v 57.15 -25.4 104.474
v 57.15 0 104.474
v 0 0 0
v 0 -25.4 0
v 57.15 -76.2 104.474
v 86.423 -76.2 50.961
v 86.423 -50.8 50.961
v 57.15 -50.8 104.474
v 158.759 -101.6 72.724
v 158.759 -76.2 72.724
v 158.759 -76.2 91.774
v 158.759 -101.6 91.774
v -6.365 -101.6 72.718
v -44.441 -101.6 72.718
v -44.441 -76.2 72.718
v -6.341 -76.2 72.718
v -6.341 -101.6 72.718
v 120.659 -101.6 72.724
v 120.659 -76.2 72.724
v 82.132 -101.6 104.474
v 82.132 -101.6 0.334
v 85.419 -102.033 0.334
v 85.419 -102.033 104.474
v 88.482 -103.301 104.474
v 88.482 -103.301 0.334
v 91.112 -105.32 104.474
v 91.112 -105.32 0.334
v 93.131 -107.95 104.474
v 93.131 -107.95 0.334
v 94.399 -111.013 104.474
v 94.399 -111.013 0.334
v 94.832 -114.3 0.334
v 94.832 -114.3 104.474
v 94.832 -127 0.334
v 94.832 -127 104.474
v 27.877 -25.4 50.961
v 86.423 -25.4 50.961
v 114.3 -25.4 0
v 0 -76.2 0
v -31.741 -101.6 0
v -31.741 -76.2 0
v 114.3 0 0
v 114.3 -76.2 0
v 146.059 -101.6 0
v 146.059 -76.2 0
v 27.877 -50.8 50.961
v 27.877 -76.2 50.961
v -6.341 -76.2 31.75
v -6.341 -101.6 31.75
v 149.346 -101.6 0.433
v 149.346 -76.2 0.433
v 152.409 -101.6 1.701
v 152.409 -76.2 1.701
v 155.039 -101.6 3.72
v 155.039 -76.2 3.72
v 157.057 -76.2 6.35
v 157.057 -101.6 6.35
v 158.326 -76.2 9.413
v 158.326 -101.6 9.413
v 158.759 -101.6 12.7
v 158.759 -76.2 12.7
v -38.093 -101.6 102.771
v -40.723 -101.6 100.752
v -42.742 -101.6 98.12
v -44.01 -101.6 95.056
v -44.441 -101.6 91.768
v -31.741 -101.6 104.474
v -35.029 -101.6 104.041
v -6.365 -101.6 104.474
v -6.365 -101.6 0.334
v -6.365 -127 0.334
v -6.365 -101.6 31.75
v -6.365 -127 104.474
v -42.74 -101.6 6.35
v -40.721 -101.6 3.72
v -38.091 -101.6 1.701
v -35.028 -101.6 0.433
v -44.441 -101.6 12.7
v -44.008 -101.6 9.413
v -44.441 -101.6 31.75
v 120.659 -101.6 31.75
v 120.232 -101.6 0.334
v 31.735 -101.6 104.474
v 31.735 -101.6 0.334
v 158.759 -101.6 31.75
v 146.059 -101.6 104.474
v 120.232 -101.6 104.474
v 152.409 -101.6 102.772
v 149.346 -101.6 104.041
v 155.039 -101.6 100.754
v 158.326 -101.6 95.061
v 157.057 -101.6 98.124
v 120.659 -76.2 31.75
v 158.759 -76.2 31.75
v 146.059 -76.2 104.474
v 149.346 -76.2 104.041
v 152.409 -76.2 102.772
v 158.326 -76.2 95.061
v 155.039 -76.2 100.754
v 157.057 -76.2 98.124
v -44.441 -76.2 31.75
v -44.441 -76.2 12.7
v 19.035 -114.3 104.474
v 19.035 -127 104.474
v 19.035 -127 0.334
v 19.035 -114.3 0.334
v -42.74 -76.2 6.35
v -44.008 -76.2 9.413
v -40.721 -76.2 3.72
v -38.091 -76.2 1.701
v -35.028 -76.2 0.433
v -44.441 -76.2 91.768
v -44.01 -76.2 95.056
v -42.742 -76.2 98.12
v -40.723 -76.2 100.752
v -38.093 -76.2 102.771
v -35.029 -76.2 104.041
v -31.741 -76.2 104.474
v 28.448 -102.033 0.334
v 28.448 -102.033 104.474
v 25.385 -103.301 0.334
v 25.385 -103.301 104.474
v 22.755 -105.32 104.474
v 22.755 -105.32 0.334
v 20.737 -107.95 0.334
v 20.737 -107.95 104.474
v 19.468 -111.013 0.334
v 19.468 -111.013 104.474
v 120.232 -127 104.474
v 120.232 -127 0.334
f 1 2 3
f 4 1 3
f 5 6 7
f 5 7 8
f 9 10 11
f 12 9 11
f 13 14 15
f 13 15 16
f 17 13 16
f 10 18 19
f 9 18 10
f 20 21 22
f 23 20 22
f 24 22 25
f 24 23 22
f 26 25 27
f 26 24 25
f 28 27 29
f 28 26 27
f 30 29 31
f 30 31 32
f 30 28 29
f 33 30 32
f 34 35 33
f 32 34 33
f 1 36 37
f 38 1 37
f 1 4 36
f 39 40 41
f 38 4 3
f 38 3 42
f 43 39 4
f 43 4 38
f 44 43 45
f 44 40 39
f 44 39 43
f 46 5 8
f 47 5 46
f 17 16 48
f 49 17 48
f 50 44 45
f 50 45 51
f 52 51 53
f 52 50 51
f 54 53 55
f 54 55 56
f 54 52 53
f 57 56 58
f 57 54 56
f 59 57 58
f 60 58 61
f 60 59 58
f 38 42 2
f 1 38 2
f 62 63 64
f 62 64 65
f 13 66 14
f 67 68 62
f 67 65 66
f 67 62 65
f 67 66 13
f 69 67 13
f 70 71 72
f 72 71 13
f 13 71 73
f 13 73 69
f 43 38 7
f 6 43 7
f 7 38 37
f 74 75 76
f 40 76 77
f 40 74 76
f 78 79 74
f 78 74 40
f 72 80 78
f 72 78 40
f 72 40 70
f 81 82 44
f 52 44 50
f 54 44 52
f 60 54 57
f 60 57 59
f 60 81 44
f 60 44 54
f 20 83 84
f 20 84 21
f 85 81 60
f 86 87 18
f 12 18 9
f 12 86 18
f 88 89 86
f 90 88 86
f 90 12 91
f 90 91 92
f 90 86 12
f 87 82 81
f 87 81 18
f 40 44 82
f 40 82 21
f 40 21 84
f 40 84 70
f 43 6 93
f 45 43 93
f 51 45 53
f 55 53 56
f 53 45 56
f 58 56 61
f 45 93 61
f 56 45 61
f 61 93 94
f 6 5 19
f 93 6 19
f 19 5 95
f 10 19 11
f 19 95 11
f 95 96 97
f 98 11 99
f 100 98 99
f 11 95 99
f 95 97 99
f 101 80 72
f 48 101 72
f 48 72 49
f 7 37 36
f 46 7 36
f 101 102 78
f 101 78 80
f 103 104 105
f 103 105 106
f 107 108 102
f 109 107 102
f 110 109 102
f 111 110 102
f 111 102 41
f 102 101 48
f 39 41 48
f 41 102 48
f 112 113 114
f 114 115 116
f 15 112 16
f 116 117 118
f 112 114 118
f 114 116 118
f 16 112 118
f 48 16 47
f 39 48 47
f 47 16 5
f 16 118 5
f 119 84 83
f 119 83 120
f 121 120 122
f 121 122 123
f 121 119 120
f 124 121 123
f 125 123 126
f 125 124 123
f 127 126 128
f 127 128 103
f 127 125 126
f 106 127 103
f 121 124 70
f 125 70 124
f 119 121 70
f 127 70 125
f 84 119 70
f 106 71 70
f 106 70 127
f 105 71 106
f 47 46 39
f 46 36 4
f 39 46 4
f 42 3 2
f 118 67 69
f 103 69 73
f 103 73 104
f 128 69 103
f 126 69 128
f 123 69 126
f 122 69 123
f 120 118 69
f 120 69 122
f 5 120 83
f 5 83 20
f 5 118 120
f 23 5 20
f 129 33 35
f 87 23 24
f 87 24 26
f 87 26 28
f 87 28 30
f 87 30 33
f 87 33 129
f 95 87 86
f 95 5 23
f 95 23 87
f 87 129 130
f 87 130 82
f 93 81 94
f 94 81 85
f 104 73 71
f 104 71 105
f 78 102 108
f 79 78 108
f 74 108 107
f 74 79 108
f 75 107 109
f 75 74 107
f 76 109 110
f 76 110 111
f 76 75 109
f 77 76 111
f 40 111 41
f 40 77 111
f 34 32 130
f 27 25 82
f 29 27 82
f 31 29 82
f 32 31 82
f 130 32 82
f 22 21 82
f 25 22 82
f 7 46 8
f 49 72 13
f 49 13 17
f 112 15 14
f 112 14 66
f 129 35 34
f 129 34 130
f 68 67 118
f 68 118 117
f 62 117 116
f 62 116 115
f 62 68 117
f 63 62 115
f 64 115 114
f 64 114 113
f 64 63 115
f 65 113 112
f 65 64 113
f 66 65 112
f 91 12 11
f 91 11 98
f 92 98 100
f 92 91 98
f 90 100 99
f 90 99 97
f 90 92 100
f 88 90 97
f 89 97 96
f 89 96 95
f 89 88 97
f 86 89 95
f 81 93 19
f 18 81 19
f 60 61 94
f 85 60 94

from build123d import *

# Parameters (mm, degrees)
F1_DEPTH  = 25.4
F3_DEPTH  = 25.4
F5_DEPTH  = 25.4
F7_DEPTH  = 25.4
F9_DEPTH  = 25.4
F10_W     = 25.4
F10_H     = 31.75
F11_DEPTH = 25.4
F12_W     = 25.4
F12_H     = 31.75
F12_H_2   = 31.756058
F13_DEPTH = 25.4
F14_W     = 12.7
F14_H     = 19.05
F15_DEPTH = 25.4
F16_W     = 12.7
F16_H     = 19.05
F17_DEPTH = 25.4
F18_W     = 25.4
F18_H     = 25.4
F19_DEPTH = 104.14
F21_DEPTH = 104.14
F23_DEPTH = 104.14


with BuildPart() as f1:
    # F0 (on Front) → F1 (new body)
    with BuildSketch(Plane.XZ):
        Polygon((57.15, 104.473576), (0, 0), (57.15, 0), (57.15, 53.673576), align=None)
        Polygon((57.15, 53.673576), (57.15, 0), (114.3, 0), (57.15, 104.473576), align=None)
    extrude(amount=F1_DEPTH)

    # F2 (on face) → F3 (join)
    with BuildSketch(Plane.XZ.offset(25.4)):
        Polygon((86.422825, 50.961122), (57.15, 50.961122), (27.877175, 50.961122), (0, 0), (114.3, 0), align=None)
    extrude(amount=F3_DEPTH)

    # F4 (on face) → F5 (join)
    with BuildSketch(Plane.XZ.offset(50.8)):
        Polygon((86.422825, 50.961122), (27.877175, 50.961122), (0, 0), (114.3, 0), align=None)
    extrude(amount=F5_DEPTH)

    # F6 (on face) → F7 (join)
    with BuildSketch(Plane.XZ.offset(76.2)):
        Polygon((27.877175, 50.961122), (57.15, 50.961122), (57.15, 104.473576), align=None)
        Polygon((57.15, 104.473576), (57.15, 50.961122), (86.422825, 50.961122), align=None)
    extrude(amount=-F7_DEPTH)

    # F8 (on face) → F9 (join)
    with BuildSketch(Plane.XZ.offset(76.2)):
        Polygon((120.65897, 104.473576), (57.15, 104.473576), (-6.34103, 104.473576), (-6.34103, 0), (120.65897, 0), align=None)
    extrude(amount=F9_DEPTH)

    # F10 (on face) → F11 (join)
    with BuildSketch(Plane.XZ.offset(101.6)):
        with Locations((133.35897, 88.598576)):
            Rectangle(F10_W, F10_H)
        with Locations((133.35897, 15.875)):
            Rectangle(F10_W, F10_H)
    extrude(amount=-F11_DEPTH)

    # F12 (on face) → F13 (join)
    with BuildSketch(Plane.XZ.offset(101.6)):
        with Locations((-19.04103, 15.875)):
            Rectangle(F12_W, F12_H)
        with Locations((-19.04103, 88.595547)):
            Rectangle(F12_W, F12_H_2)
    extrude(amount=-F13_DEPTH)

    # F14 (on face) → F15 (join)
    with BuildSketch(Plane.XZ.offset(101.6)):
        with Locations((-38.09103, 22.225)):
            Rectangle(F14_W, F14_H)
        with BuildLine():
            Line((-31.74103, 0), (-31.74103, 12.7))
            Line((-31.74103, 12.7), (-44.44103, 12.7))
            ThreePointArc((-44.44103, 12.7), (-40.721286, 3.719744), (-31.74103, 0))
        make_face()
        with Locations((-38.09103, 82.242518)):
            Rectangle(F14_W, F14_H)
        with BuildLine():
            Line((-44.44103, 91.767518), (-31.74103, 91.767518))
            Line((-31.74103, 91.767518), (-31.74103, 104.473576))
            ThreePointArc((-31.74103, 104.473576), (-40.723428, 100.75169), (-44.44103, 91.767518))
        make_face()
    extrude(amount=-F15_DEPTH)

    # F16 (on face) → F17 (join)
    with BuildSketch(Plane.XZ.offset(101.6)):
        with Locations((152.40897, 82.248576)):
            Rectangle(F16_W, F16_H)
        with BuildLine():
            Line((146.05897, 104.473576), (146.05897, 91.773576))
            Line((146.05897, 91.773576), (158.75897, 91.773576))
            ThreePointArc((158.75897, 91.773576), (155.039226, 100.753832), (146.05897, 104.473576))
        make_face()
        with Locations((152.40897, 22.225)):
            Rectangle(F16_W, F16_H)
        with BuildLine():
            Line((158.75897, 12.7), (146.05897, 12.7))
            Line((146.05897, 12.7), (146.05897, 0))
            ThreePointArc((146.05897, 0), (155.039226, 3.719744), (158.75897, 12.7))
        make_face()
    extrude(amount=-F17_DEPTH)

    # F18 (on face) → F19 (join)
    with BuildSketch(Plane.XY.offset(104.473576)):
        with Locations((107.532152, -114.3)):
            Rectangle(F18_W, F18_H)
        with Locations((6.33521, -114.3)):
            Rectangle(F18_W, F18_H)
    extrude(amount=-F19_DEPTH)

    # F20 (on face) → F21 (join)
    with BuildSketch(Plane(origin=(0, 0, 0.333576), x_dir=(1, 0, 0), z_dir=(0, 0, -1))):
        with BuildLine():
            Line((19.03521, 114.3), (19.03521, 101.6))
            Line((19.03521, 101.6), (31.73521, 101.6))
            ThreePointArc((31.73521, 101.6), (22.754954, 105.319744), (19.03521, 114.3))
        make_face()
    extrude(amount=-F21_DEPTH)

    # F22 (on face) → F23 (join)
    with BuildSketch(Plane.XY.offset(104.473576)):
        with BuildLine():
            Line((94.832152, -114.3), (94.832152, -101.6))
            Line((94.832152, -101.6), (82.132152, -101.6))
            ThreePointArc((82.132152, -101.6), (91.112408, -105.319744), (94.832152, -114.3))
        make_face()
    extrude(amount=-F23_DEPTH)


solid = f1.part
